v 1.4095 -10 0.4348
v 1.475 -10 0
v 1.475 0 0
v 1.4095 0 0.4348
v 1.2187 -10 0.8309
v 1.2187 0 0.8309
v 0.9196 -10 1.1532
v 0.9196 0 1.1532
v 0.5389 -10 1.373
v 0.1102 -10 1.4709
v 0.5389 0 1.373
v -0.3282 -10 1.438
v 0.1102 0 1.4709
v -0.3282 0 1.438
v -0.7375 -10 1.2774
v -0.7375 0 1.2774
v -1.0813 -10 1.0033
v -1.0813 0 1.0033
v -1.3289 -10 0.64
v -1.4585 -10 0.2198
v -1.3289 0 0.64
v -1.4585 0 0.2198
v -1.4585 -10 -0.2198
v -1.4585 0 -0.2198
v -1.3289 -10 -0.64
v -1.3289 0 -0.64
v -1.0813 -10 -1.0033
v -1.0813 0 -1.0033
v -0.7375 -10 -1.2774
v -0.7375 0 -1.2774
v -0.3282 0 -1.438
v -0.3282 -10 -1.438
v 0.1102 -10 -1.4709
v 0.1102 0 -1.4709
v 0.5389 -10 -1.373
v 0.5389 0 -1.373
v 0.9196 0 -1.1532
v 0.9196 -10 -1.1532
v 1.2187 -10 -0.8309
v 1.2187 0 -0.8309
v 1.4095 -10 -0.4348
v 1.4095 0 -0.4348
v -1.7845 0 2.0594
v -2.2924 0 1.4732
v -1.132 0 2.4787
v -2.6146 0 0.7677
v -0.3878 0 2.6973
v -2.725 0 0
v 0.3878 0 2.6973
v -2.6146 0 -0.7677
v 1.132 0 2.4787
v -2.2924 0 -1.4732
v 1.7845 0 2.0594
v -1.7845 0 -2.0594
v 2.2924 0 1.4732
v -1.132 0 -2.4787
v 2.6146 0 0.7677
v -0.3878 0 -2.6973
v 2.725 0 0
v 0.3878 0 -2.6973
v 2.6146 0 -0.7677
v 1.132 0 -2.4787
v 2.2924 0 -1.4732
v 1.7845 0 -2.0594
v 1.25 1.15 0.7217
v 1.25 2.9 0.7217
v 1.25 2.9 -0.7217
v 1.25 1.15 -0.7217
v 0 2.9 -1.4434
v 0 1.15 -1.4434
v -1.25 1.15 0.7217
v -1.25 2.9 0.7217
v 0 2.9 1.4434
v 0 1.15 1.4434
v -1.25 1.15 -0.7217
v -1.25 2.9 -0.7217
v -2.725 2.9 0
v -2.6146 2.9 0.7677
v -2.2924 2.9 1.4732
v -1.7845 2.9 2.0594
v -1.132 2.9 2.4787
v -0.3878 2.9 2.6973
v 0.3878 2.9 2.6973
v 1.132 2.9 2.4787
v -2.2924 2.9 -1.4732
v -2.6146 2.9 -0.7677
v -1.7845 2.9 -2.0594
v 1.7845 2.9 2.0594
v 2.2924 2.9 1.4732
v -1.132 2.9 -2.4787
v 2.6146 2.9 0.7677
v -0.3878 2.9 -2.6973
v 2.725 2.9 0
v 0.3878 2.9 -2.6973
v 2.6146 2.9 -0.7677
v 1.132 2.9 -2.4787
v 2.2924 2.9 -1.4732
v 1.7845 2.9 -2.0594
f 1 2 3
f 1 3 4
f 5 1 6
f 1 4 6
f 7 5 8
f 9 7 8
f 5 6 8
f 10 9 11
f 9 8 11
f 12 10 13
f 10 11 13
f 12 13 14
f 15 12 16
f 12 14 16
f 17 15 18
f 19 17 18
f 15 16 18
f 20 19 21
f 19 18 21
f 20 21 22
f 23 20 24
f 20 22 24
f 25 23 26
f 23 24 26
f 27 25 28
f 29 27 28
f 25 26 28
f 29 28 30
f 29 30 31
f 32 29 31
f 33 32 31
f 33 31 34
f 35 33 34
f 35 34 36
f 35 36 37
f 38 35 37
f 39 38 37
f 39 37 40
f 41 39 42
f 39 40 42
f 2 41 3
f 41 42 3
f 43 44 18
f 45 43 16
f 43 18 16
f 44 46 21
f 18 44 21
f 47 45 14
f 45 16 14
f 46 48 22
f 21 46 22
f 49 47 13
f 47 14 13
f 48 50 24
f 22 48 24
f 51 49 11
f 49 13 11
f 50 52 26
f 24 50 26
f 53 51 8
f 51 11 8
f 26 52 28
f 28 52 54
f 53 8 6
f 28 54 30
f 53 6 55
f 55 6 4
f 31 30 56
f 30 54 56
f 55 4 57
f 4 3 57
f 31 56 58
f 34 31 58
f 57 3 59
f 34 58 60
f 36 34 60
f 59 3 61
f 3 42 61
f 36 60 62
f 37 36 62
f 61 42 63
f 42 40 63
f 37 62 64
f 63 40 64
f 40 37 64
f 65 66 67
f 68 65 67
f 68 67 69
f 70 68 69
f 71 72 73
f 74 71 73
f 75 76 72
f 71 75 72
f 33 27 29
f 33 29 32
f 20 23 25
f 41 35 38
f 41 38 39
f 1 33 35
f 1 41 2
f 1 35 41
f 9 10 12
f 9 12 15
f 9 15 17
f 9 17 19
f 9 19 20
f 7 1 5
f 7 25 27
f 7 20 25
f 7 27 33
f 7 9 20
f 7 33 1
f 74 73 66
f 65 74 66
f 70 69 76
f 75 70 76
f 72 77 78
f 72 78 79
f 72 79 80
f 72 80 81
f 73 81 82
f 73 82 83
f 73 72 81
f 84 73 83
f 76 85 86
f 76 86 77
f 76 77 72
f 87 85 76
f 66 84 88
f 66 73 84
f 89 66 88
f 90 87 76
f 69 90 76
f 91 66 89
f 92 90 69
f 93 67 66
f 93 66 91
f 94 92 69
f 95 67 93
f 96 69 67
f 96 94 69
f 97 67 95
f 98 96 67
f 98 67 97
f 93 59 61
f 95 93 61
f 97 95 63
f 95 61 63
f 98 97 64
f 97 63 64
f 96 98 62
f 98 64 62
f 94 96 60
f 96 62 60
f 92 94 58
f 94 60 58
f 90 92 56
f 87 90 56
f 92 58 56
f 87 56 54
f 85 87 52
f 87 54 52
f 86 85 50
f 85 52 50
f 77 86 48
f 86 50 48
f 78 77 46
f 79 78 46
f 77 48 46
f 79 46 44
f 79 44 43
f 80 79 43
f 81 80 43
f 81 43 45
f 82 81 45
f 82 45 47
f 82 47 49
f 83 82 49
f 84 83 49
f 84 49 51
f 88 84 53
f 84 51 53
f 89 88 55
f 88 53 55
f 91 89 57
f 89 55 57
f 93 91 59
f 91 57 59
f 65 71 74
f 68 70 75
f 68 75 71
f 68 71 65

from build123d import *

# Parameters (mm, degrees)
SKETCH1_R           = 2.725
BOSS_EXTRUDE1_DEPTH = 2.9
SKETCH2_R           = 1.475
BOSS_EXTRUDE2_DEPTH = 10
CUT_EXTRUDE1_DEPTH  = 1.75


with BuildPart() as part:
    # Sketch1 → Boss-Extrude1 (new body)
    with BuildSketch(Plane(origin=(0, 0, 0), x_dir=(1, 0, 0), z_dir=(0, 1, 0))):
        Circle(SKETCH1_R)
    extrude(amount=BOSS_EXTRUDE1_DEPTH)

    # Sketch2 → Boss-Extrude2 (add)
    with BuildSketch(Plane.XZ):
        Circle(SKETCH2_R)
    extrude(amount=BOSS_EXTRUDE2_DEPTH)

    # Sketch3 → Cut-Extrude1 (cut)
    with BuildSketch(Plane(origin=(0, 2.9, 0), x_dir=(1, 0, 0), z_dir=(0, 1, 0))):
        Polygon((0, 1.443375673), (-1.25, 0.721687836), (-1.25, -0.721687836), (0, -1.443375673), (1.25, -0.721687836), (1.25, 0.721687836), align=None)
    extrude(amount=-CUT_EXTRUDE1_DEPTH, mode=Mode.SUBTRACT)


solid = part.part
